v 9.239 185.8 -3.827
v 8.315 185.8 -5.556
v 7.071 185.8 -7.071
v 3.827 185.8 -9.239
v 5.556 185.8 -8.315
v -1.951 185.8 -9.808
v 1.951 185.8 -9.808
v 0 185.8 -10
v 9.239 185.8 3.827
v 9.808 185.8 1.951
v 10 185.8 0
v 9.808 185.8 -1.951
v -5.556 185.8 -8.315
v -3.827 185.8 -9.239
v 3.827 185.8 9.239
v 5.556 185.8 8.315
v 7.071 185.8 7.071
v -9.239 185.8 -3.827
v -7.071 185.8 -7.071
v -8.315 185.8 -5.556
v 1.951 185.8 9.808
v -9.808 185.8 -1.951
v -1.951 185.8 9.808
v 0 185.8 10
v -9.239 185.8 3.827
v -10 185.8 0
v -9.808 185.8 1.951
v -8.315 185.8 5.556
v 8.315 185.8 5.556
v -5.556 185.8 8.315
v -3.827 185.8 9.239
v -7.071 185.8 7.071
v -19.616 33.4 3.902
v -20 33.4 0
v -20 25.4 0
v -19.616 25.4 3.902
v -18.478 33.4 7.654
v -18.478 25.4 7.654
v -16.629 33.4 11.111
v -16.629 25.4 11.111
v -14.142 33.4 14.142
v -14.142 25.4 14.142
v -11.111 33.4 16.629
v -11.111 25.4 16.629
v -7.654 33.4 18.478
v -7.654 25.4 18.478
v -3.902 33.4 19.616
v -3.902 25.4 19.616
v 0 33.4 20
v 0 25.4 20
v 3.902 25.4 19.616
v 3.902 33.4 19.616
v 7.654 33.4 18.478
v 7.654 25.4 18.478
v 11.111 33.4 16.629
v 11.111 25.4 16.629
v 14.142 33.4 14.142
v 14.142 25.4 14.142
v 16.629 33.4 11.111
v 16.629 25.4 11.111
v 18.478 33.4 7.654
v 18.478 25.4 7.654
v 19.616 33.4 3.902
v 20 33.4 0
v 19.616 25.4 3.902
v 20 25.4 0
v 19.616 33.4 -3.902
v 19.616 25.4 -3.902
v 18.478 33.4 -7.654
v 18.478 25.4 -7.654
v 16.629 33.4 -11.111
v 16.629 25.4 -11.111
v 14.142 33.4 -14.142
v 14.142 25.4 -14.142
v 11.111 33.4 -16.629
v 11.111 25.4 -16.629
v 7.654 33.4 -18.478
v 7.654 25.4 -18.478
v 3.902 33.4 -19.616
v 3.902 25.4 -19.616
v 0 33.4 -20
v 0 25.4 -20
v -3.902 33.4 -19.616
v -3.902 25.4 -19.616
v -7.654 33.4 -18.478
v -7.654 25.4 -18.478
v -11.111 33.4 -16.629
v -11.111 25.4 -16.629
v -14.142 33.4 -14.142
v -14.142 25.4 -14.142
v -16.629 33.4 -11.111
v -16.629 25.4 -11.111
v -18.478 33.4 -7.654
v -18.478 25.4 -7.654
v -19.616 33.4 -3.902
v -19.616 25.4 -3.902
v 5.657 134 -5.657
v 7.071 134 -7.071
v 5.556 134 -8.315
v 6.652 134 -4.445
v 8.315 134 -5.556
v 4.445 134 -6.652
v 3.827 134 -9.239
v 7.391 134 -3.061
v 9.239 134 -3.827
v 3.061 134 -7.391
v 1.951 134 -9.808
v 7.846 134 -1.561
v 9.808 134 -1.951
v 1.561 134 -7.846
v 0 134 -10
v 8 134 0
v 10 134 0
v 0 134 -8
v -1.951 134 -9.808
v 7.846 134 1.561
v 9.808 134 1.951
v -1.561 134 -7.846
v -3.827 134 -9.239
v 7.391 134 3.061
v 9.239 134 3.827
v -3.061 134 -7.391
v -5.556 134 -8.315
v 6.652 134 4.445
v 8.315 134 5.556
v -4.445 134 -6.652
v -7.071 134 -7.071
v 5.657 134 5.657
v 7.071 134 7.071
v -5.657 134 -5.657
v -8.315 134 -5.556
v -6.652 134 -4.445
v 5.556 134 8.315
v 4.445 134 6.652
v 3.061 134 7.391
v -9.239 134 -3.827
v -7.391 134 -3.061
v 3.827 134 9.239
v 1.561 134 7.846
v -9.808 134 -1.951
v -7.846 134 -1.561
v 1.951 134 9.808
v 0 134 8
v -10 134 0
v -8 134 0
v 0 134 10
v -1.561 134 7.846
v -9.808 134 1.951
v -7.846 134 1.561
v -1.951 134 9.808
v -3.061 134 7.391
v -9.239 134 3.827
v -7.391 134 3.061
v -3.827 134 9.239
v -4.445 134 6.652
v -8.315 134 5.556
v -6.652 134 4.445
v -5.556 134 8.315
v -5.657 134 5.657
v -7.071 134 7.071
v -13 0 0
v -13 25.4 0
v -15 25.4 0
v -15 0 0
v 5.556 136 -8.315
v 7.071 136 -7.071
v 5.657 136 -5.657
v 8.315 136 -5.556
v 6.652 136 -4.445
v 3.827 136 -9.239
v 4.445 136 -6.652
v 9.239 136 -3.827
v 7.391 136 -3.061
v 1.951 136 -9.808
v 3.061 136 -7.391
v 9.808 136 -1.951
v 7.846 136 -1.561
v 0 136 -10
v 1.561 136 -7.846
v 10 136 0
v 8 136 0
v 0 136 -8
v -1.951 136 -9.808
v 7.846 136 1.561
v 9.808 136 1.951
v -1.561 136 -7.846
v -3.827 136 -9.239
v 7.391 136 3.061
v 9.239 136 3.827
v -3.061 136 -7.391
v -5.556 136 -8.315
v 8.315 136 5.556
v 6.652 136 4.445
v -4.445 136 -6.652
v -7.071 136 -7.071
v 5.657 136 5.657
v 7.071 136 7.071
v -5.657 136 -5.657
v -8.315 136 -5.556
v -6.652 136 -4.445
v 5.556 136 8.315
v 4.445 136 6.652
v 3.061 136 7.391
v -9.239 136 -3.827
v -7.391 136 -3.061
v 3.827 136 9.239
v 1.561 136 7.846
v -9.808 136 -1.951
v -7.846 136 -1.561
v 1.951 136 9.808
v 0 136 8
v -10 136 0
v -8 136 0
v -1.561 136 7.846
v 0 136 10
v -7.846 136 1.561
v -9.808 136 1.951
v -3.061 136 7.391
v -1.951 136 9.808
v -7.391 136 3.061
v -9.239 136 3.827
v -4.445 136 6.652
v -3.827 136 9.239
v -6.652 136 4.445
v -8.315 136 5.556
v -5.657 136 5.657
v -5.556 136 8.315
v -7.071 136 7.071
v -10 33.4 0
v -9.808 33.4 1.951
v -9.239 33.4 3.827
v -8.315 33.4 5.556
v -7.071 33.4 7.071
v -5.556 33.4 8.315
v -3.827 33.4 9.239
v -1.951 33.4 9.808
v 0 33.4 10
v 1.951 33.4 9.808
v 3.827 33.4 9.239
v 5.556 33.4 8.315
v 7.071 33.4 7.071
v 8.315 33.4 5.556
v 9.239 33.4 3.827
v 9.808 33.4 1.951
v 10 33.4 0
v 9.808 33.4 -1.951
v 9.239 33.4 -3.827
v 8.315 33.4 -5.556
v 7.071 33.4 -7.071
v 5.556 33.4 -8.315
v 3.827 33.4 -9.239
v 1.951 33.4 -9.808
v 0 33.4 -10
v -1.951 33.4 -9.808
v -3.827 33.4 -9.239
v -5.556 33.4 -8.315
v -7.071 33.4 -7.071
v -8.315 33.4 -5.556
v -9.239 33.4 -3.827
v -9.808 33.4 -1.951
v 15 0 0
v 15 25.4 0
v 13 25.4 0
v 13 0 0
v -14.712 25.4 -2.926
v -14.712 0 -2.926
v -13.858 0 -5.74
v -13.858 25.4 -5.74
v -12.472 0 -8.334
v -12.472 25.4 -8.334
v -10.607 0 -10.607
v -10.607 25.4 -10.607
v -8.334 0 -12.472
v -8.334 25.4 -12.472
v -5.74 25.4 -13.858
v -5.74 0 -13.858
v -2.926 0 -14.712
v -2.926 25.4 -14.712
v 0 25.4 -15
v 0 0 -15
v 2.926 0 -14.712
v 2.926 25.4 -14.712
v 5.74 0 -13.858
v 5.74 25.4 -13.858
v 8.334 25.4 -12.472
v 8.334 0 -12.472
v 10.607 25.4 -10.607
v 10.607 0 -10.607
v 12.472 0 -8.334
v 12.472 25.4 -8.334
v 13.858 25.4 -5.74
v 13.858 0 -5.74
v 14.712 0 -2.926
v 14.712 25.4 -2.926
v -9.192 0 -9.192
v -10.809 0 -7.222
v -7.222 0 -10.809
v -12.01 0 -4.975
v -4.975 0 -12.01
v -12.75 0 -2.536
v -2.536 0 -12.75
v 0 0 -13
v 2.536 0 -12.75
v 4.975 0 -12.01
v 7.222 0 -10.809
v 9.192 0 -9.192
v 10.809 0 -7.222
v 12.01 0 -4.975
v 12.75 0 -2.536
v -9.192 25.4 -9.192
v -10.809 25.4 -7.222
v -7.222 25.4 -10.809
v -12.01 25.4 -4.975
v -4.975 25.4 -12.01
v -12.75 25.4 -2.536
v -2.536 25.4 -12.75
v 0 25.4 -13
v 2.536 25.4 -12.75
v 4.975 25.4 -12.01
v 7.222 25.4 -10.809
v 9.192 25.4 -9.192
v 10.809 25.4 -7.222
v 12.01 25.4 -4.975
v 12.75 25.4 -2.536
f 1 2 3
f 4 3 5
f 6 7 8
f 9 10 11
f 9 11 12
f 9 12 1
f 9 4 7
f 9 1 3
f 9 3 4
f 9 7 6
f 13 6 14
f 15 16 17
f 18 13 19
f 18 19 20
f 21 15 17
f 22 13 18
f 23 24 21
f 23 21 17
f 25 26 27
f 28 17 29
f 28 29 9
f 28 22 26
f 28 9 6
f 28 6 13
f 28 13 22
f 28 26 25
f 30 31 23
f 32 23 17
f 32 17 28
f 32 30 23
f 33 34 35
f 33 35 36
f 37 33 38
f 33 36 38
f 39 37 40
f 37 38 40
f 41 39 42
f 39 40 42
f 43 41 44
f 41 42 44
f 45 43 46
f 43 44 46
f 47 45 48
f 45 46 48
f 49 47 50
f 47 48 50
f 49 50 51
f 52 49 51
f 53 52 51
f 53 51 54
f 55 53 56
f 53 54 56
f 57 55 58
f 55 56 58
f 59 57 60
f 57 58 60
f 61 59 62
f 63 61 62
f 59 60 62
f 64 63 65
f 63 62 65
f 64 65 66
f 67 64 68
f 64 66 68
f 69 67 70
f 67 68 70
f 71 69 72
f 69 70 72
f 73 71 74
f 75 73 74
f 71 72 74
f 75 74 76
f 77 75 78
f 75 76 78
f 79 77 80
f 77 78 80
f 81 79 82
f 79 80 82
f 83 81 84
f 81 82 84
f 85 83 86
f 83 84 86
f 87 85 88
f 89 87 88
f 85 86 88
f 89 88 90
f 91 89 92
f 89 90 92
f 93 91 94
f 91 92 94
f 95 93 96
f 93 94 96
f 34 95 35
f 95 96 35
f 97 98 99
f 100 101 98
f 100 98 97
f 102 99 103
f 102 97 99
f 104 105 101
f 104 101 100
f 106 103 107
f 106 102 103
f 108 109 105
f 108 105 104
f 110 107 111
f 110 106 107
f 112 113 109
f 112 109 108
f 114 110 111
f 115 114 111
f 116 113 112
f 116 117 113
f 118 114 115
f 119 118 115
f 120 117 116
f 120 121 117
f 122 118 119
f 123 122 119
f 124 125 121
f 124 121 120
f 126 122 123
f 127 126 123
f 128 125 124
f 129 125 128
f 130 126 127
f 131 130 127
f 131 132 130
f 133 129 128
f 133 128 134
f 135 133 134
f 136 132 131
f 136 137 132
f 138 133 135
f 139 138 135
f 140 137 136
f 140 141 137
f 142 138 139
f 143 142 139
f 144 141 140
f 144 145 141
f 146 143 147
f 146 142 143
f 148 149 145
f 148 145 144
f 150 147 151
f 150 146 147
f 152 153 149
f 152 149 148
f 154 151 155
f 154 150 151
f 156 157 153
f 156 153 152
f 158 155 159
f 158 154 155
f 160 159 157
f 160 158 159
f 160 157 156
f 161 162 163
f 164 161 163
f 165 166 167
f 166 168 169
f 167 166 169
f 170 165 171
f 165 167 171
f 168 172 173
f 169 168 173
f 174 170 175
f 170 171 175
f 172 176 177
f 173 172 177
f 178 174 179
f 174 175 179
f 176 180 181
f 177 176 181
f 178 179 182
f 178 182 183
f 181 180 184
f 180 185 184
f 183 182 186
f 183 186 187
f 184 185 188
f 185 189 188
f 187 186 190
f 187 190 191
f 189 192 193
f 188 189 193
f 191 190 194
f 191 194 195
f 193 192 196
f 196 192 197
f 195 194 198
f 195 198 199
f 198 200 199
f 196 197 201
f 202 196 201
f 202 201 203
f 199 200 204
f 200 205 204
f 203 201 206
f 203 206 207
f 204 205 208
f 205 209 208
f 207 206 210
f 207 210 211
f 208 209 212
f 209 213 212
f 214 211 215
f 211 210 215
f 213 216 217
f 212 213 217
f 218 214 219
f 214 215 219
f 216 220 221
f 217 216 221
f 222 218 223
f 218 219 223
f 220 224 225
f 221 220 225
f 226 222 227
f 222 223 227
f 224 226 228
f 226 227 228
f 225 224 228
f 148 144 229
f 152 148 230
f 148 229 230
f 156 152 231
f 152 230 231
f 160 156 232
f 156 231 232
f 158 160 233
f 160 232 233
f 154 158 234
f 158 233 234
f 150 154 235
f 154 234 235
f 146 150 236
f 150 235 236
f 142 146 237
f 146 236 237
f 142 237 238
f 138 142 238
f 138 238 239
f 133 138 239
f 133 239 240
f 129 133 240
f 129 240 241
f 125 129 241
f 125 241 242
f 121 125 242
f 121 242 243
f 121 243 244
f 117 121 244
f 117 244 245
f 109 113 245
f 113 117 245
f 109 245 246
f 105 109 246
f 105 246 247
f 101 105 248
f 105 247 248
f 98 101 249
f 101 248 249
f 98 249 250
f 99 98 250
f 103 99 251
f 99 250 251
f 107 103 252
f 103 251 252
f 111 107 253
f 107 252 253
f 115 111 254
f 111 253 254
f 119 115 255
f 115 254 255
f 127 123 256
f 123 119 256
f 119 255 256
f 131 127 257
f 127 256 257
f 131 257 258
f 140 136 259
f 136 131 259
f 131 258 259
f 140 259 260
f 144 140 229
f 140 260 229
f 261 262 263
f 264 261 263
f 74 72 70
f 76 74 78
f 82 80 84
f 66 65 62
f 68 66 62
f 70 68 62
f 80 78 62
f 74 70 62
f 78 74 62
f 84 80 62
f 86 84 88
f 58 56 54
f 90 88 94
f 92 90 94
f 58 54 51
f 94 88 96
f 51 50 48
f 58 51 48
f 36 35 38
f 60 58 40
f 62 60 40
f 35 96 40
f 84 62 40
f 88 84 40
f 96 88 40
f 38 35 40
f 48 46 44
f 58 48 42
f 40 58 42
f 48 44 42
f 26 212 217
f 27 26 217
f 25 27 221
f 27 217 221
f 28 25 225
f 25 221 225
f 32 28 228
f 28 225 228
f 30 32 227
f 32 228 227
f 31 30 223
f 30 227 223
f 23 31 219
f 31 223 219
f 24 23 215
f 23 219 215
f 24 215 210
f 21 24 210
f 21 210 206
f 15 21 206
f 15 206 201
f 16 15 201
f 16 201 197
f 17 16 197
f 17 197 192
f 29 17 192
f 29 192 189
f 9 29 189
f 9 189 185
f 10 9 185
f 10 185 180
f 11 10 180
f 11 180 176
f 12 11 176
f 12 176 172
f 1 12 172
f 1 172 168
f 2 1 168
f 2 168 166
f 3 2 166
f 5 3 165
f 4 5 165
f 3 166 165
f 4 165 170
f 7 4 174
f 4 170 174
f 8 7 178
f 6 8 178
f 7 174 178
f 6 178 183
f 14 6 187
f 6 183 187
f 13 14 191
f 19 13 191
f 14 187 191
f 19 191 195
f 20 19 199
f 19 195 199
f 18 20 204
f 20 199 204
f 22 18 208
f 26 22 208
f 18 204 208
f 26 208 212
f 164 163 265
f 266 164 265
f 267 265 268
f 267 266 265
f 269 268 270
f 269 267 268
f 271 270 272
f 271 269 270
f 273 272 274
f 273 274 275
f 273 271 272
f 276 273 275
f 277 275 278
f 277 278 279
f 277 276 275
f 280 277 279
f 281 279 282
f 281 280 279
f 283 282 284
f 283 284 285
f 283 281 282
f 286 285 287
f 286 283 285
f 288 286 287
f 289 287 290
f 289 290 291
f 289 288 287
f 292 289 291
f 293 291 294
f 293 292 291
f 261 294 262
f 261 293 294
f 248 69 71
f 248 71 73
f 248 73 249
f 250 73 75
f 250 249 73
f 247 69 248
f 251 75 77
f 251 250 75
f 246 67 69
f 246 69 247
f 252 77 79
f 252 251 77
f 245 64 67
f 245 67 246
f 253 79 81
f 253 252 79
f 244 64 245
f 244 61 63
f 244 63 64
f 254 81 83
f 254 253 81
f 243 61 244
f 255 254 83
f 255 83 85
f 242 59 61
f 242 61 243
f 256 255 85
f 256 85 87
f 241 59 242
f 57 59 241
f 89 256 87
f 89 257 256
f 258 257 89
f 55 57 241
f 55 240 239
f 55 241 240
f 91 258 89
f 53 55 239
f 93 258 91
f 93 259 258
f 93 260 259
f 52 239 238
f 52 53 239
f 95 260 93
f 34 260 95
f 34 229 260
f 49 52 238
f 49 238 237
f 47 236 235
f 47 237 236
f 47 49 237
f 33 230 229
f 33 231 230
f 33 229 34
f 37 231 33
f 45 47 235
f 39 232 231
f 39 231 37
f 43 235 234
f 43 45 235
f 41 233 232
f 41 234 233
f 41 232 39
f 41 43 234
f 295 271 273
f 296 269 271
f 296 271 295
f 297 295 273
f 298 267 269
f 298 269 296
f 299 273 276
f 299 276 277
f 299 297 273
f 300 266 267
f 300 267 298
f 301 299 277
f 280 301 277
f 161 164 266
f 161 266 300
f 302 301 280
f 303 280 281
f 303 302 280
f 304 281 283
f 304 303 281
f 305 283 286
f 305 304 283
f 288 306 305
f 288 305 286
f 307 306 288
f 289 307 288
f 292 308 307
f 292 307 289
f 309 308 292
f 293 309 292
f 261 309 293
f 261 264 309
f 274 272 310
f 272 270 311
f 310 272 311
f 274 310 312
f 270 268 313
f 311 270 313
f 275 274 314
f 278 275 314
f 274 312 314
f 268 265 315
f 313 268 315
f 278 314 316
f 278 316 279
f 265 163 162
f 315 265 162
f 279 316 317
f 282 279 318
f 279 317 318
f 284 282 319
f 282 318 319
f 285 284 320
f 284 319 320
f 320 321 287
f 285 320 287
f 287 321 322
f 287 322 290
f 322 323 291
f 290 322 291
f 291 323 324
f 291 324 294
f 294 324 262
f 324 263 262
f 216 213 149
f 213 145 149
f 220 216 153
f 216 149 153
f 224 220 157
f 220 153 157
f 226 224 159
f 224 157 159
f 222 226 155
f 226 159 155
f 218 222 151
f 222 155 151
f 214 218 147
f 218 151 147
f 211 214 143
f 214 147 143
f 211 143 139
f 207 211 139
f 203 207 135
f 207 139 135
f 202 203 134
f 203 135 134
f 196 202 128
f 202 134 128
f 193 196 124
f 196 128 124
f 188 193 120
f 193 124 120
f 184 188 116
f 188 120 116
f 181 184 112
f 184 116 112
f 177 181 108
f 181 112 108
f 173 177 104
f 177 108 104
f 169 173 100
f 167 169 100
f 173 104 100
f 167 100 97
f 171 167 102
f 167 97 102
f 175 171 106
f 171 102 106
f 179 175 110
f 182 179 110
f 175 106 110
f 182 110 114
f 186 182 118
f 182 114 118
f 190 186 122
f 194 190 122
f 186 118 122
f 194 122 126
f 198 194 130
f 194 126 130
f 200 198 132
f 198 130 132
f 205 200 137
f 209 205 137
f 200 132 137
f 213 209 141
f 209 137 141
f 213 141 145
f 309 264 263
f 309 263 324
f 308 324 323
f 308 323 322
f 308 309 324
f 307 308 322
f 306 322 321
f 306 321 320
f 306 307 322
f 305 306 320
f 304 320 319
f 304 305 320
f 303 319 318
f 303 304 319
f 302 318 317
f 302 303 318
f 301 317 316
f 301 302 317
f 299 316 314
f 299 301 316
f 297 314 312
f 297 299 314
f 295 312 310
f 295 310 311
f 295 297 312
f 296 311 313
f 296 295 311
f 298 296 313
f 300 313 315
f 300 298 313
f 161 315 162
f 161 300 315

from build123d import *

# Parameters (mm, degrees)
F1_DEPTH = 25.4
F2_R     = 20
F3_DEPTH = 8
F4_R     = 10
F5_DEPTH = 152.4
F7_R     = 12.7
F7_R_2   = 8
F8_DEPTH = 1


with BuildPart() as f1:
    # F0 (on Front) → F1 (new body)
    with BuildSketch(Plane.XZ):
        with BuildLine():
            Line((-13, 0), (-15, 0))
            ThreePointArc((-15, 0), (0, -15), (15, 0))
            Line((15, 0), (13, 0))
            ThreePointArc((13, 0), (0, -13), (-13, 0))
        make_face()
    extrude(amount=-F1_DEPTH)


with BuildPart() as f3:
    # F2 (on face) → F3 (new body)
    with BuildSketch(Plane(origin=(0, 25.4, 0), x_dir=(-1, 0, 0), z_dir=(0, 1, 0))):
        Circle(F2_R)
        with BuildLine():
            Line((-15, 0), (-13, 0))
            ThreePointArc((-13, 0), (0, -13), (13, 0))
            Line((13, 0), (15, 0))
            ThreePointArc((15, 0), (0, -15), (-15, 0))
        make_face(mode=Mode.SUBTRACT)
        with BuildLine():
            ThreePointArc((13, 0), (0, -13), (-13, 0))
            Line((-13, 0), (-15, 0))
            ThreePointArc((-15, 0), (0, -15), (15, 0))
            Line((15, 0), (13, 0))
        make_face()
    extrude(amount=F3_DEPTH)

    # F4 (on face) → F5 (join)
    with BuildSketch(Plane(origin=(0, 33.4, 0), x_dir=(-1, 0, 0), z_dir=(0, 1, 0))):
        Circle(F4_R)
    extrude(amount=F5_DEPTH)

    # F7 (on offset) → F8 (cut, symmetric)
    with BuildSketch(Plane(origin=(0, 135, 0), x_dir=(-1, 0, 0), z_dir=(0, 1, 0))):
        Circle(F7_R)
        Circle(F7_R_2, mode=Mode.SUBTRACT)
    extrude(amount=F8_DEPTH, both=True, mode=Mode.SUBTRACT)


solid = Compound([f1.part, f3.part])
